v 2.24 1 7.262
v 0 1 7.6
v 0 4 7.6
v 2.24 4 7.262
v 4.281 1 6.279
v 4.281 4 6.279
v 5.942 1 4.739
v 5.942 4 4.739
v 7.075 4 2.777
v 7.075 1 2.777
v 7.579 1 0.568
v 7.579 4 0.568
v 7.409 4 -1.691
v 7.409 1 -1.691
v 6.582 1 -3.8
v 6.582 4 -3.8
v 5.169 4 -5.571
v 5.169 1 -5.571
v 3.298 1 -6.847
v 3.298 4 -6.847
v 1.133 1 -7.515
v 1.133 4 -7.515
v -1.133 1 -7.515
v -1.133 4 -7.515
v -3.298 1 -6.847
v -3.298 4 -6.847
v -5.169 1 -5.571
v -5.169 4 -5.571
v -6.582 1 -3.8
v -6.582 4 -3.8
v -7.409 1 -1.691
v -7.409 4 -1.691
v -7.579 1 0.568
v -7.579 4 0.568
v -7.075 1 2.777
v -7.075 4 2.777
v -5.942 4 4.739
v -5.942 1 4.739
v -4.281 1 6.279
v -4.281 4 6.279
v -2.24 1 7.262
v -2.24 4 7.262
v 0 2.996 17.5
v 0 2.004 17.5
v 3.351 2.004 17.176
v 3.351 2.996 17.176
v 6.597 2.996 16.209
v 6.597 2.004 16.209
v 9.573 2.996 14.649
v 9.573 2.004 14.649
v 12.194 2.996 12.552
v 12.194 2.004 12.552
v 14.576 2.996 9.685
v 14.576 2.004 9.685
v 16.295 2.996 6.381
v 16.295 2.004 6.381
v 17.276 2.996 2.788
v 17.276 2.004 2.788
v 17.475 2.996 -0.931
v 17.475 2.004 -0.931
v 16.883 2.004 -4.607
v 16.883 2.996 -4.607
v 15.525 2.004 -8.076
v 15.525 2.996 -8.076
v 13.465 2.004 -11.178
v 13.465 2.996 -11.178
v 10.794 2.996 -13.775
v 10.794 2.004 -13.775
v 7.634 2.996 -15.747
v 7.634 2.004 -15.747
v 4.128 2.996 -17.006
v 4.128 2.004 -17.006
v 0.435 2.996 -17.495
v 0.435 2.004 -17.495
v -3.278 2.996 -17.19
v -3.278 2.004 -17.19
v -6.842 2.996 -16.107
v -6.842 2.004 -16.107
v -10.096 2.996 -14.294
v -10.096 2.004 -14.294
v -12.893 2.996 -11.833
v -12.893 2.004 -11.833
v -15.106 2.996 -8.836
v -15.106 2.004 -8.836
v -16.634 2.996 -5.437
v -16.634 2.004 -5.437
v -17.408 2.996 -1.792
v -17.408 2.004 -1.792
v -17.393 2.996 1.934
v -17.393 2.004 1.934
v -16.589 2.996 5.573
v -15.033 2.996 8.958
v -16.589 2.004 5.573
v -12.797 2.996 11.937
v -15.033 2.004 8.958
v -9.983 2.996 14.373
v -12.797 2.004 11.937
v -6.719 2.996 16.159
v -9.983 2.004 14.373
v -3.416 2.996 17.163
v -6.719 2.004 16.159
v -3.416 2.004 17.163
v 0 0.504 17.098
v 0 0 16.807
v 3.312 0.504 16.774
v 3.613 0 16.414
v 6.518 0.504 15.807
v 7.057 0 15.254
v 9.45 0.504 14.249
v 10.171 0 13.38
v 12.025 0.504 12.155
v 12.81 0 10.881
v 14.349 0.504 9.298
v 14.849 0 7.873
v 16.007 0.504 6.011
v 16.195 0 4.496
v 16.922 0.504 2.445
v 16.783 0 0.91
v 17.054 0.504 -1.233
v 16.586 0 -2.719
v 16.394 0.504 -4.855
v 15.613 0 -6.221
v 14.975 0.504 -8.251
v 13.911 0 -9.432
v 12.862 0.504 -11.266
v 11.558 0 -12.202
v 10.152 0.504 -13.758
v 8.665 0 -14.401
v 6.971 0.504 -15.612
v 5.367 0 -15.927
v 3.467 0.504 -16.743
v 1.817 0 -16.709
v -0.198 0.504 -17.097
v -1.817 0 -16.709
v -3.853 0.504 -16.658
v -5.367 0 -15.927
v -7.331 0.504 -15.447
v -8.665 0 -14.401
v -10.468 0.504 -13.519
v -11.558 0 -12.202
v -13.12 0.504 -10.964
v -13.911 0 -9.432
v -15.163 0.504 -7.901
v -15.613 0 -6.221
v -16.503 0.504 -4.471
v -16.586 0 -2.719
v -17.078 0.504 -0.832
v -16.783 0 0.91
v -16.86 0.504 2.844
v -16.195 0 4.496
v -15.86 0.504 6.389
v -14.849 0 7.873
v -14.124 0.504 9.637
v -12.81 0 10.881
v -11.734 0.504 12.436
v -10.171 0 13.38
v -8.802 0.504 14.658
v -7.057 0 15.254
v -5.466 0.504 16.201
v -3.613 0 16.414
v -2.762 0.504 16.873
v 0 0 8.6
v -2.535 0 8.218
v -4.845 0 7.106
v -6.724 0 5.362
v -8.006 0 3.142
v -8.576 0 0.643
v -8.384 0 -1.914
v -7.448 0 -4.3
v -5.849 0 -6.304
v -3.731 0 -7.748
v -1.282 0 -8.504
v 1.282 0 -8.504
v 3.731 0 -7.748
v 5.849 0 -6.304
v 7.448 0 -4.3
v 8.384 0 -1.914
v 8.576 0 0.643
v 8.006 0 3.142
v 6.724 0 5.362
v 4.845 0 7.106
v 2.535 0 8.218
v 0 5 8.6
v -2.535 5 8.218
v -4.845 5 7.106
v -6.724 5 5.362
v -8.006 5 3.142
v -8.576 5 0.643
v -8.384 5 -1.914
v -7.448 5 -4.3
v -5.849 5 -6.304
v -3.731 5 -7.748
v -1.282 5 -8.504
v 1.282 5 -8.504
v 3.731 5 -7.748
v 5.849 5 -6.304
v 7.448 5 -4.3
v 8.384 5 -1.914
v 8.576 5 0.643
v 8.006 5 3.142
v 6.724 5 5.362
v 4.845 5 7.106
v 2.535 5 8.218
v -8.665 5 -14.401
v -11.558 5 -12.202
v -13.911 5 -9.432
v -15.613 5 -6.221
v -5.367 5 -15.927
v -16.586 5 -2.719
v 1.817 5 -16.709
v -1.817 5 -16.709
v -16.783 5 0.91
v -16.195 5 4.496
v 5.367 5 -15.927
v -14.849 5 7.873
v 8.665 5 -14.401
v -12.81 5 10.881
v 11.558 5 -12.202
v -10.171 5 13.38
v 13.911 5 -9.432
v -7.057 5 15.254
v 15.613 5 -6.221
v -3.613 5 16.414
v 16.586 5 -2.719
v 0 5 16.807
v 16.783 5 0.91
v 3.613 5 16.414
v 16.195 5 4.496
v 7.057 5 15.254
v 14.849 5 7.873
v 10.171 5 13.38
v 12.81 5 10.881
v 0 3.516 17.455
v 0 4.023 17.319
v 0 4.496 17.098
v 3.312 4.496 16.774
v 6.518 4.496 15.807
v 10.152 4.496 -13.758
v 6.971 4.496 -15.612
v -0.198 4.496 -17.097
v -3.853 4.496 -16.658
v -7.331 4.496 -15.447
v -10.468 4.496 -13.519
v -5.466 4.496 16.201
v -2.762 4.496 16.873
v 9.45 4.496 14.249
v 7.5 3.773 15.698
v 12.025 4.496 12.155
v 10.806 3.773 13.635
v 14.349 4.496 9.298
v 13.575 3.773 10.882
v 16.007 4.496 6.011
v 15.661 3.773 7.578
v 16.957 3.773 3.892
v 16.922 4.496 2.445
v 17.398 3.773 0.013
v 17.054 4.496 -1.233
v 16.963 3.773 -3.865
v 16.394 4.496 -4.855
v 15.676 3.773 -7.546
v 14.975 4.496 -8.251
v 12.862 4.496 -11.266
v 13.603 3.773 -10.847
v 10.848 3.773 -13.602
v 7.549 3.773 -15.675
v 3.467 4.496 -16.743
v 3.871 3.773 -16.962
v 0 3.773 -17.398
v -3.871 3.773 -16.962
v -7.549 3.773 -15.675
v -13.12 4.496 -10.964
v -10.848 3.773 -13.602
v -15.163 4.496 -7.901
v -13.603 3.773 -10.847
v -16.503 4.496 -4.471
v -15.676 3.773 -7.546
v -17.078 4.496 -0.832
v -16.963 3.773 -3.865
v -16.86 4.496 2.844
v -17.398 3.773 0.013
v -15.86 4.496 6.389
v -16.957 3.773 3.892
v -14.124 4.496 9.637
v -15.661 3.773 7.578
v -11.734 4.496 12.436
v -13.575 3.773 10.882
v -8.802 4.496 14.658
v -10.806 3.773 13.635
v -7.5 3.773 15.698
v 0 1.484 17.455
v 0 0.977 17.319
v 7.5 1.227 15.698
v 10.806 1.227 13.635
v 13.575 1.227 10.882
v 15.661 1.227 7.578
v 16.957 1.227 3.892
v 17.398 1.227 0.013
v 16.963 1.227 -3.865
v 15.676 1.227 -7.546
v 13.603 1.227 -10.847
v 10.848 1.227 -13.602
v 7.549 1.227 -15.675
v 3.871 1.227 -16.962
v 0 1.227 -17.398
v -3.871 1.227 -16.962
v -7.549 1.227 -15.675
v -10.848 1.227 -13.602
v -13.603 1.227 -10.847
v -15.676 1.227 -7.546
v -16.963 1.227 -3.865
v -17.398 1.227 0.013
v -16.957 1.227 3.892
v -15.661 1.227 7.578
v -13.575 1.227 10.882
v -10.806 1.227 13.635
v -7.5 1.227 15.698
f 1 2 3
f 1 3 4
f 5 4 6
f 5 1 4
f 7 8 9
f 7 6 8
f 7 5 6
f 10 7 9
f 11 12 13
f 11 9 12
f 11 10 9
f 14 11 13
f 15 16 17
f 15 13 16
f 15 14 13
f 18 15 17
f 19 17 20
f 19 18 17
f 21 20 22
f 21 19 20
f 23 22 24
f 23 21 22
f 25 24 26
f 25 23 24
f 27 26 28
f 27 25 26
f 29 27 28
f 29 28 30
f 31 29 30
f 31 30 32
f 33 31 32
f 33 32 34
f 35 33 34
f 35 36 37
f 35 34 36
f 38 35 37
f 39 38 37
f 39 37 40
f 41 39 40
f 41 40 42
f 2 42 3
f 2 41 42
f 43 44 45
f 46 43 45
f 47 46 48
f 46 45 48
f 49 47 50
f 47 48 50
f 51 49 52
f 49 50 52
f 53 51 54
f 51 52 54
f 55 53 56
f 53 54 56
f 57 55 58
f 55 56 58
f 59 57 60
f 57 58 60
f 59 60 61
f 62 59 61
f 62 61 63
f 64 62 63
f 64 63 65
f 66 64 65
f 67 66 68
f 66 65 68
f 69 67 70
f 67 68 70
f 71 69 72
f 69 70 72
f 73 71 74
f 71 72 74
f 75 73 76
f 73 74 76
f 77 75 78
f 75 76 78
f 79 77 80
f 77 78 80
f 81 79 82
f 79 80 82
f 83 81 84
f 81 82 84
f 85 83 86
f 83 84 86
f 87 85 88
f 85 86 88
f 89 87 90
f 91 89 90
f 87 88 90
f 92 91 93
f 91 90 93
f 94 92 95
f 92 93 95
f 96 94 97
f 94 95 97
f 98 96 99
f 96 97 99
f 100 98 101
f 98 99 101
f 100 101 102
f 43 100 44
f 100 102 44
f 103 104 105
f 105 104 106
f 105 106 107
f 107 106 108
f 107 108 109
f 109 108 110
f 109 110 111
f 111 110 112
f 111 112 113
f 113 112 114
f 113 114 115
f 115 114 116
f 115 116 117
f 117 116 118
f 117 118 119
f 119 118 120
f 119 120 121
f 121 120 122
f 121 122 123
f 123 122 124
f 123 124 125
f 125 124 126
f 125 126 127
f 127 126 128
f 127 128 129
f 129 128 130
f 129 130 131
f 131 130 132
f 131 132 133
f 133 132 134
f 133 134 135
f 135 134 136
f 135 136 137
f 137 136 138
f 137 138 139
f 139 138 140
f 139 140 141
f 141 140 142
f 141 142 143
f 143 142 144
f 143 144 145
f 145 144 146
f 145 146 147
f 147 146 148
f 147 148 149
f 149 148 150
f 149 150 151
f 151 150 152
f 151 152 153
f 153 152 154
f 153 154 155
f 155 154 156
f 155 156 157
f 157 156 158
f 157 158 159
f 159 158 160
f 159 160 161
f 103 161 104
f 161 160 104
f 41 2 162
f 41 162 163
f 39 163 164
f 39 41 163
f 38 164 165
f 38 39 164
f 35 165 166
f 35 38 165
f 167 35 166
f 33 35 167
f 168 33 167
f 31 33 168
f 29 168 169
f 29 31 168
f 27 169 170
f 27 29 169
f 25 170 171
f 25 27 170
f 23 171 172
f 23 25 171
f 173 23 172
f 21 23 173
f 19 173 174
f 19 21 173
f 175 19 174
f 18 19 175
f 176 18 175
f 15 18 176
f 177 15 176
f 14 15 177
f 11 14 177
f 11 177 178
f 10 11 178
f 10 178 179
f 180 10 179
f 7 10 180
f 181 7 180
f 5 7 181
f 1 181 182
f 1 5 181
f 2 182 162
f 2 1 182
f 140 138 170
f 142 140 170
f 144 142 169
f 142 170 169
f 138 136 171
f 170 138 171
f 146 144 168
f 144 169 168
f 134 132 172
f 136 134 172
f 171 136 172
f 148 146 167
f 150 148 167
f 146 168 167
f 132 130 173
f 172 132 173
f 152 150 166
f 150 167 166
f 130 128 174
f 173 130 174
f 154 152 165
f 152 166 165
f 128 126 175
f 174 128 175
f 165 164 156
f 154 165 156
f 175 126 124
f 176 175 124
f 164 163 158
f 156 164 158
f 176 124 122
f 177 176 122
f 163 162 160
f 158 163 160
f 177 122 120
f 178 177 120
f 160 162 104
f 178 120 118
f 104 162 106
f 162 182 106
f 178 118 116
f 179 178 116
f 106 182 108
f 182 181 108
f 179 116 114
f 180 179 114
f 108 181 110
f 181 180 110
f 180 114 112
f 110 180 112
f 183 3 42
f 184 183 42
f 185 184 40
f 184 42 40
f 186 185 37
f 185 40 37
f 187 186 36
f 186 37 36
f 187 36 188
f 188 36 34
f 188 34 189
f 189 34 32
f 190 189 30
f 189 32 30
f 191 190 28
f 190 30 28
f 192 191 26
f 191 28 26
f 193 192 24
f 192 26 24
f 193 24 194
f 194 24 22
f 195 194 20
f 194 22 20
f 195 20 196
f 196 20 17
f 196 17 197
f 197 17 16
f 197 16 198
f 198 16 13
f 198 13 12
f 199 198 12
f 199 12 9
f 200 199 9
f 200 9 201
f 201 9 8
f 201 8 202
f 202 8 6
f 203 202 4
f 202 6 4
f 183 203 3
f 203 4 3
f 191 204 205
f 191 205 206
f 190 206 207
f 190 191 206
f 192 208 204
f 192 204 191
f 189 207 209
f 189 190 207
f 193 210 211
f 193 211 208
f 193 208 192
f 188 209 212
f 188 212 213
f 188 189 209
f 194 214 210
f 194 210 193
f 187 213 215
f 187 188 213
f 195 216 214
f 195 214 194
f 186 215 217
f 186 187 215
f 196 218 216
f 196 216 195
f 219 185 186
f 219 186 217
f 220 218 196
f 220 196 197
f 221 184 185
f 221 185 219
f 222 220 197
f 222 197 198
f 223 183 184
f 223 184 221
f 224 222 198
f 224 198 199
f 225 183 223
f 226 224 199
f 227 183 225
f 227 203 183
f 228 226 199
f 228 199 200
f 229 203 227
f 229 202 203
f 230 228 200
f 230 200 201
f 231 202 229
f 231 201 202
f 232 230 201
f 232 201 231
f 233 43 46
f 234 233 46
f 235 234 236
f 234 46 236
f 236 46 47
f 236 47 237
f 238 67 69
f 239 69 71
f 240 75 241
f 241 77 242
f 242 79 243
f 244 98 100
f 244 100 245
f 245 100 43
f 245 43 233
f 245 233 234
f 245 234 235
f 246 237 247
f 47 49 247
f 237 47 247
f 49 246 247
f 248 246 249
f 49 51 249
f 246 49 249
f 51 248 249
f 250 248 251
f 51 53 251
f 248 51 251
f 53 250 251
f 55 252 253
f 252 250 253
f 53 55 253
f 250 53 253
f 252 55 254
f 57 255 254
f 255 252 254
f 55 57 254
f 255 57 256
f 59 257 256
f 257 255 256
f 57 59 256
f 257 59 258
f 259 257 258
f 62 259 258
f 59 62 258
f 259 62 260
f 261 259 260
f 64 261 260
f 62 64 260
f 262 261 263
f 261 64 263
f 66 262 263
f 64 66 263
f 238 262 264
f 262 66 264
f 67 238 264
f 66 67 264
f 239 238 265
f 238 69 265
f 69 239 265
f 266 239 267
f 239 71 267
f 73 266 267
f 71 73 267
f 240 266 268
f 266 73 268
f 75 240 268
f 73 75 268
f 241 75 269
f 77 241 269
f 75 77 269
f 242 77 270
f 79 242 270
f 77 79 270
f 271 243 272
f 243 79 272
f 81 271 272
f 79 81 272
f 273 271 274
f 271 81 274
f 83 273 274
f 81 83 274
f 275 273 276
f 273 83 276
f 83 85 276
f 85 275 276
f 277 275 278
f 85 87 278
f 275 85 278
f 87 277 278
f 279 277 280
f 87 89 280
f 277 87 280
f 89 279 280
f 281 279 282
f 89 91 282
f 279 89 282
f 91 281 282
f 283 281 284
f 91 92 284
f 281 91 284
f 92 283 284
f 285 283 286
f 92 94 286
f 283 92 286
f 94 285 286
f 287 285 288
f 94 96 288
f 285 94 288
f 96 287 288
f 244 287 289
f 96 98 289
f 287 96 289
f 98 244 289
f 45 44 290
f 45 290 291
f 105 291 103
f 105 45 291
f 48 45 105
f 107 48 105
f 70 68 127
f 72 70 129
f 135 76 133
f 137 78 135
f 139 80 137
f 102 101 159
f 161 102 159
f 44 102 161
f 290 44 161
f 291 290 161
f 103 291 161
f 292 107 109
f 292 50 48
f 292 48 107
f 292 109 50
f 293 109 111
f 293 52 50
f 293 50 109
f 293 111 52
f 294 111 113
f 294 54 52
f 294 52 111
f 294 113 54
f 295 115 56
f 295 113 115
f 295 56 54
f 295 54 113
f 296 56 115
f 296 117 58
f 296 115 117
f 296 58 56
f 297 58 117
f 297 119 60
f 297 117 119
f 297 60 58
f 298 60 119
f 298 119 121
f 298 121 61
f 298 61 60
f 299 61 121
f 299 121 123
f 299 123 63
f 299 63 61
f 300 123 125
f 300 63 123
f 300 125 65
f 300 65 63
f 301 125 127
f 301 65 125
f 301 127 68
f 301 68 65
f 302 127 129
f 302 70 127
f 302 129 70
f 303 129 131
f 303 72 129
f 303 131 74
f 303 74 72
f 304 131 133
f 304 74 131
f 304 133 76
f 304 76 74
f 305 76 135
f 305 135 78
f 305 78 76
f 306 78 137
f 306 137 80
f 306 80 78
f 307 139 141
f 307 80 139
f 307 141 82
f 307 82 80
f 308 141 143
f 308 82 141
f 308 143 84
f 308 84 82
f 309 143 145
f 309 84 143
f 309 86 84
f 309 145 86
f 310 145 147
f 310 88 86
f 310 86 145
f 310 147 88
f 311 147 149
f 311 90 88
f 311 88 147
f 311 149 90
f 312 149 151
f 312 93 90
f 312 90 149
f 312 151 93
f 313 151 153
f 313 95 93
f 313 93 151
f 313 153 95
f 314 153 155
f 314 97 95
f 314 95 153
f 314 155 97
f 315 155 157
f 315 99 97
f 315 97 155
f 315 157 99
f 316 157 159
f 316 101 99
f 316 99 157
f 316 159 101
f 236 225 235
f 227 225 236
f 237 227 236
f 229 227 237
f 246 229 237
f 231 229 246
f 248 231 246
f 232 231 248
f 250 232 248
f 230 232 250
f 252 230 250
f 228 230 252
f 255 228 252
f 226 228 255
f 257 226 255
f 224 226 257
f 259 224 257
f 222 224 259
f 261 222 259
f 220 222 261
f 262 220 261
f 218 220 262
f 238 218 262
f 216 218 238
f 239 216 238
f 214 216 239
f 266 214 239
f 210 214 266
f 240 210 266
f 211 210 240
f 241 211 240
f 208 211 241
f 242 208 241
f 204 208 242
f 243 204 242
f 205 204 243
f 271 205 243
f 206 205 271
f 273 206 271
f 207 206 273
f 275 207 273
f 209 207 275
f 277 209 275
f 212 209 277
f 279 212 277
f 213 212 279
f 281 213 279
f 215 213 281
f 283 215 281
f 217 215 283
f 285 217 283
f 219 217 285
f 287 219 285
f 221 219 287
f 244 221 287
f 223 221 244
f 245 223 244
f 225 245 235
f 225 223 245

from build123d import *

# Parameters (mm, degrees)
SKETCH_1_R               = 17.5
EXTRUDE_1_DEPTH          = 5
CUT_EXTRUDE_1_DEPTH      = 26.248762346
CUT_EXTRUDE_1_DEPTH_BACK = 26.248762346
SKETCH_2_R               = 7.6
CHAMFER_1_SIZE           = 1.2
CHAMFER_1_SIZE2          = 0.692820323
FILLET_1_R               = 3
CHAMFER_2_SIZE           = 1


with BuildPart() as part:
    # 스케치1 → 보스-돌출1 (new body)
    with BuildSketch(Plane(origin=(0, 0, 0), x_dir=(1, 0, 0), z_dir=(0, 1, 0))):
        with Locations(Location((0, 0, 0), (0, 0, 270))):
            Circle(SKETCH_1_R)
    extrude(amount=EXTRUDE_1_DEPTH)

    # 스케치2 → 컷-돌출1 (cut, two sides: drawn at the far end of the back side and taken through both)
    with BuildSketch(Plane(origin=(0, 5, 0), x_dir=(1, 0, 0), z_dir=(0, 1, 0)).offset(-CUT_EXTRUDE_1_DEPTH_BACK)):
        with Locations(Location((0, 0, 0), (0, 0, 270))):
            Circle(SKETCH_2_R)
    extrude(amount=CUT_EXTRUDE_1_DEPTH + CUT_EXTRUDE_1_DEPTH_BACK, mode=Mode.SUBTRACT)

    # 모따기1
    chamfer_1_edges = [part.edges().sort_by_distance(p)[0] for p in [
        (0, 0, -17.5),
        (0, 5, -17.5),
    ]]
    chamfer_1_side = [part.faces().sort_by_distance(p)[0] for p in [
        (0, 2.5, -17.5),
    ]]
    chamfer(chamfer_1_edges, length=CHAMFER_1_SIZE, length2=CHAMFER_1_SIZE2, reference=chamfer_1_side[0])

    # 필렛1
    fillet_1_edges = [part.edges().sort_by_distance(p)[0] for p in [
        (0, 1.2, -17.5),
        (0, 3.8, -17.5),
    ]]
    fillet(fillet_1_edges, radius=FILLET_1_R)

    # 모따기2
    chamfer_2_edges = [part.edges().sort_by_distance(p)[0] for p in [
        (0, 5, -7.6),
        (0, 0, -7.6),
    ]]
    chamfer(chamfer_2_edges, length=CHAMFER_2_SIZE)


solid = part.part
